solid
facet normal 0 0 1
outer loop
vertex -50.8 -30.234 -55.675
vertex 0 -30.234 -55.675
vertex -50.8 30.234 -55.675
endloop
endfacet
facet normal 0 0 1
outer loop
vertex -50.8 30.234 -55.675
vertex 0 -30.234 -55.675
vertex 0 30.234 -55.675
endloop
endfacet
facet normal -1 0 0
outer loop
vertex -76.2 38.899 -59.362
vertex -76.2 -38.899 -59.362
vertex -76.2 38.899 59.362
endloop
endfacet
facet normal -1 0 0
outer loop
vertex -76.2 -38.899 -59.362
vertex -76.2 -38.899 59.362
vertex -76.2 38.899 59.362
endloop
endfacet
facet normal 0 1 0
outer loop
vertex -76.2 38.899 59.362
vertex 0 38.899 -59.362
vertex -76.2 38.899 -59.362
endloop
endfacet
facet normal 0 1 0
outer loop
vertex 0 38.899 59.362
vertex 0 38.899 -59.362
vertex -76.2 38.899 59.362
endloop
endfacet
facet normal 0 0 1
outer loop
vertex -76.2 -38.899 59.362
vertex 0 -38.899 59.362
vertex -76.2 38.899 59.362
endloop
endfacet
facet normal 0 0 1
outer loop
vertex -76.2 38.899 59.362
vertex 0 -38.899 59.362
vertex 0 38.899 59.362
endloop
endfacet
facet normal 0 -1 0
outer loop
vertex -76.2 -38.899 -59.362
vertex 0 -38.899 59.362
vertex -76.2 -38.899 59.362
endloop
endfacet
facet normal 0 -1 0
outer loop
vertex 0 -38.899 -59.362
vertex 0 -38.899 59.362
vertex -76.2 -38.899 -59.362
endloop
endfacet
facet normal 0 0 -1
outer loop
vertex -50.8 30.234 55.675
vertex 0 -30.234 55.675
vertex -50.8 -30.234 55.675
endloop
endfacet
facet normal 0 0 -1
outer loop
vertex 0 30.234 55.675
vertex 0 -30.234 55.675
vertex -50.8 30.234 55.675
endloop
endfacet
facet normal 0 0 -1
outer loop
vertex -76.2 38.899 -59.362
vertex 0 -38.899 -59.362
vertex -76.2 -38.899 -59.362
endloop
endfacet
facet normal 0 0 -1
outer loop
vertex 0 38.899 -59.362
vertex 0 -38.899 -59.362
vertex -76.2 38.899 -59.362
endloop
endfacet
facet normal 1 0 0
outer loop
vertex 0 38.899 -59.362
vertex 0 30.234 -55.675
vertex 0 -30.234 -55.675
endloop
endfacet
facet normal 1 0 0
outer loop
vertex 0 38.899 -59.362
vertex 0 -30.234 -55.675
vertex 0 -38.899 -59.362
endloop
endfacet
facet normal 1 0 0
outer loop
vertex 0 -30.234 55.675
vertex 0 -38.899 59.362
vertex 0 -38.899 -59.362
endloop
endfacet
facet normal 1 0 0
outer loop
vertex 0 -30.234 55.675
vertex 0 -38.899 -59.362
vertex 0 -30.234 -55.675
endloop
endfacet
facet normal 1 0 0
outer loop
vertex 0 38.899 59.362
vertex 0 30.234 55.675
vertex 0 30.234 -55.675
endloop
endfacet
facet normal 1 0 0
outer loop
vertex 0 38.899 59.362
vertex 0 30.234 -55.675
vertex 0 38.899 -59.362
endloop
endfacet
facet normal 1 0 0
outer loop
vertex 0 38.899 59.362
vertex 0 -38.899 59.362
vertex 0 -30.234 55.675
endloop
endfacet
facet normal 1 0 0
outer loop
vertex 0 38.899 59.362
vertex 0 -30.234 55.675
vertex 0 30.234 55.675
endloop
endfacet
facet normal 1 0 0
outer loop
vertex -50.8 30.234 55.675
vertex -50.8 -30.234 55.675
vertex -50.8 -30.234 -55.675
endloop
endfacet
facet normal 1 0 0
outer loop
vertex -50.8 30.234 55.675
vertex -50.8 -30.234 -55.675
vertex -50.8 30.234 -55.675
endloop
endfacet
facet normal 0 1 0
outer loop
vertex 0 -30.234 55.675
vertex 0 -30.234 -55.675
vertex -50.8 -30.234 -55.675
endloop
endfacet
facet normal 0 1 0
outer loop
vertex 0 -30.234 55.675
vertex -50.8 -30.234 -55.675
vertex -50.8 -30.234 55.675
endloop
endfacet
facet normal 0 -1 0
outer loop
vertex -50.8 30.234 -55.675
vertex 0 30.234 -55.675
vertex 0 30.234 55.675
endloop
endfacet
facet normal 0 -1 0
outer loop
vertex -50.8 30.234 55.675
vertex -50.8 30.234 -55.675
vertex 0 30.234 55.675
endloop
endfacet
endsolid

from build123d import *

# Parameters (mm, degrees)
F0_W     = 77.79774
F0_H     = 59.362259
F1_DEPTH = 76.2
F2_W     = 60.468386
F2_H     = 111.35032
F3_DEPTH = 50.8


with BuildPart() as f1:
    # F0 (on Right) → F1 (new body)
    with BuildSketch(Plane.YZ):
        with Locations((0, 29.681129)):
            Rectangle(F0_W, F0_H)
        with Locations((0, -29.681129)):
            Rectangle(F0_W, F0_H)
    extrude(amount=-F1_DEPTH)

    # F2 (on Right) → F3 (cut)
    with BuildSketch(Plane.YZ):
        Rectangle(F2_W, F2_H)
    extrude(amount=-F3_DEPTH, mode=Mode.SUBTRACT)


solid = f1.part
